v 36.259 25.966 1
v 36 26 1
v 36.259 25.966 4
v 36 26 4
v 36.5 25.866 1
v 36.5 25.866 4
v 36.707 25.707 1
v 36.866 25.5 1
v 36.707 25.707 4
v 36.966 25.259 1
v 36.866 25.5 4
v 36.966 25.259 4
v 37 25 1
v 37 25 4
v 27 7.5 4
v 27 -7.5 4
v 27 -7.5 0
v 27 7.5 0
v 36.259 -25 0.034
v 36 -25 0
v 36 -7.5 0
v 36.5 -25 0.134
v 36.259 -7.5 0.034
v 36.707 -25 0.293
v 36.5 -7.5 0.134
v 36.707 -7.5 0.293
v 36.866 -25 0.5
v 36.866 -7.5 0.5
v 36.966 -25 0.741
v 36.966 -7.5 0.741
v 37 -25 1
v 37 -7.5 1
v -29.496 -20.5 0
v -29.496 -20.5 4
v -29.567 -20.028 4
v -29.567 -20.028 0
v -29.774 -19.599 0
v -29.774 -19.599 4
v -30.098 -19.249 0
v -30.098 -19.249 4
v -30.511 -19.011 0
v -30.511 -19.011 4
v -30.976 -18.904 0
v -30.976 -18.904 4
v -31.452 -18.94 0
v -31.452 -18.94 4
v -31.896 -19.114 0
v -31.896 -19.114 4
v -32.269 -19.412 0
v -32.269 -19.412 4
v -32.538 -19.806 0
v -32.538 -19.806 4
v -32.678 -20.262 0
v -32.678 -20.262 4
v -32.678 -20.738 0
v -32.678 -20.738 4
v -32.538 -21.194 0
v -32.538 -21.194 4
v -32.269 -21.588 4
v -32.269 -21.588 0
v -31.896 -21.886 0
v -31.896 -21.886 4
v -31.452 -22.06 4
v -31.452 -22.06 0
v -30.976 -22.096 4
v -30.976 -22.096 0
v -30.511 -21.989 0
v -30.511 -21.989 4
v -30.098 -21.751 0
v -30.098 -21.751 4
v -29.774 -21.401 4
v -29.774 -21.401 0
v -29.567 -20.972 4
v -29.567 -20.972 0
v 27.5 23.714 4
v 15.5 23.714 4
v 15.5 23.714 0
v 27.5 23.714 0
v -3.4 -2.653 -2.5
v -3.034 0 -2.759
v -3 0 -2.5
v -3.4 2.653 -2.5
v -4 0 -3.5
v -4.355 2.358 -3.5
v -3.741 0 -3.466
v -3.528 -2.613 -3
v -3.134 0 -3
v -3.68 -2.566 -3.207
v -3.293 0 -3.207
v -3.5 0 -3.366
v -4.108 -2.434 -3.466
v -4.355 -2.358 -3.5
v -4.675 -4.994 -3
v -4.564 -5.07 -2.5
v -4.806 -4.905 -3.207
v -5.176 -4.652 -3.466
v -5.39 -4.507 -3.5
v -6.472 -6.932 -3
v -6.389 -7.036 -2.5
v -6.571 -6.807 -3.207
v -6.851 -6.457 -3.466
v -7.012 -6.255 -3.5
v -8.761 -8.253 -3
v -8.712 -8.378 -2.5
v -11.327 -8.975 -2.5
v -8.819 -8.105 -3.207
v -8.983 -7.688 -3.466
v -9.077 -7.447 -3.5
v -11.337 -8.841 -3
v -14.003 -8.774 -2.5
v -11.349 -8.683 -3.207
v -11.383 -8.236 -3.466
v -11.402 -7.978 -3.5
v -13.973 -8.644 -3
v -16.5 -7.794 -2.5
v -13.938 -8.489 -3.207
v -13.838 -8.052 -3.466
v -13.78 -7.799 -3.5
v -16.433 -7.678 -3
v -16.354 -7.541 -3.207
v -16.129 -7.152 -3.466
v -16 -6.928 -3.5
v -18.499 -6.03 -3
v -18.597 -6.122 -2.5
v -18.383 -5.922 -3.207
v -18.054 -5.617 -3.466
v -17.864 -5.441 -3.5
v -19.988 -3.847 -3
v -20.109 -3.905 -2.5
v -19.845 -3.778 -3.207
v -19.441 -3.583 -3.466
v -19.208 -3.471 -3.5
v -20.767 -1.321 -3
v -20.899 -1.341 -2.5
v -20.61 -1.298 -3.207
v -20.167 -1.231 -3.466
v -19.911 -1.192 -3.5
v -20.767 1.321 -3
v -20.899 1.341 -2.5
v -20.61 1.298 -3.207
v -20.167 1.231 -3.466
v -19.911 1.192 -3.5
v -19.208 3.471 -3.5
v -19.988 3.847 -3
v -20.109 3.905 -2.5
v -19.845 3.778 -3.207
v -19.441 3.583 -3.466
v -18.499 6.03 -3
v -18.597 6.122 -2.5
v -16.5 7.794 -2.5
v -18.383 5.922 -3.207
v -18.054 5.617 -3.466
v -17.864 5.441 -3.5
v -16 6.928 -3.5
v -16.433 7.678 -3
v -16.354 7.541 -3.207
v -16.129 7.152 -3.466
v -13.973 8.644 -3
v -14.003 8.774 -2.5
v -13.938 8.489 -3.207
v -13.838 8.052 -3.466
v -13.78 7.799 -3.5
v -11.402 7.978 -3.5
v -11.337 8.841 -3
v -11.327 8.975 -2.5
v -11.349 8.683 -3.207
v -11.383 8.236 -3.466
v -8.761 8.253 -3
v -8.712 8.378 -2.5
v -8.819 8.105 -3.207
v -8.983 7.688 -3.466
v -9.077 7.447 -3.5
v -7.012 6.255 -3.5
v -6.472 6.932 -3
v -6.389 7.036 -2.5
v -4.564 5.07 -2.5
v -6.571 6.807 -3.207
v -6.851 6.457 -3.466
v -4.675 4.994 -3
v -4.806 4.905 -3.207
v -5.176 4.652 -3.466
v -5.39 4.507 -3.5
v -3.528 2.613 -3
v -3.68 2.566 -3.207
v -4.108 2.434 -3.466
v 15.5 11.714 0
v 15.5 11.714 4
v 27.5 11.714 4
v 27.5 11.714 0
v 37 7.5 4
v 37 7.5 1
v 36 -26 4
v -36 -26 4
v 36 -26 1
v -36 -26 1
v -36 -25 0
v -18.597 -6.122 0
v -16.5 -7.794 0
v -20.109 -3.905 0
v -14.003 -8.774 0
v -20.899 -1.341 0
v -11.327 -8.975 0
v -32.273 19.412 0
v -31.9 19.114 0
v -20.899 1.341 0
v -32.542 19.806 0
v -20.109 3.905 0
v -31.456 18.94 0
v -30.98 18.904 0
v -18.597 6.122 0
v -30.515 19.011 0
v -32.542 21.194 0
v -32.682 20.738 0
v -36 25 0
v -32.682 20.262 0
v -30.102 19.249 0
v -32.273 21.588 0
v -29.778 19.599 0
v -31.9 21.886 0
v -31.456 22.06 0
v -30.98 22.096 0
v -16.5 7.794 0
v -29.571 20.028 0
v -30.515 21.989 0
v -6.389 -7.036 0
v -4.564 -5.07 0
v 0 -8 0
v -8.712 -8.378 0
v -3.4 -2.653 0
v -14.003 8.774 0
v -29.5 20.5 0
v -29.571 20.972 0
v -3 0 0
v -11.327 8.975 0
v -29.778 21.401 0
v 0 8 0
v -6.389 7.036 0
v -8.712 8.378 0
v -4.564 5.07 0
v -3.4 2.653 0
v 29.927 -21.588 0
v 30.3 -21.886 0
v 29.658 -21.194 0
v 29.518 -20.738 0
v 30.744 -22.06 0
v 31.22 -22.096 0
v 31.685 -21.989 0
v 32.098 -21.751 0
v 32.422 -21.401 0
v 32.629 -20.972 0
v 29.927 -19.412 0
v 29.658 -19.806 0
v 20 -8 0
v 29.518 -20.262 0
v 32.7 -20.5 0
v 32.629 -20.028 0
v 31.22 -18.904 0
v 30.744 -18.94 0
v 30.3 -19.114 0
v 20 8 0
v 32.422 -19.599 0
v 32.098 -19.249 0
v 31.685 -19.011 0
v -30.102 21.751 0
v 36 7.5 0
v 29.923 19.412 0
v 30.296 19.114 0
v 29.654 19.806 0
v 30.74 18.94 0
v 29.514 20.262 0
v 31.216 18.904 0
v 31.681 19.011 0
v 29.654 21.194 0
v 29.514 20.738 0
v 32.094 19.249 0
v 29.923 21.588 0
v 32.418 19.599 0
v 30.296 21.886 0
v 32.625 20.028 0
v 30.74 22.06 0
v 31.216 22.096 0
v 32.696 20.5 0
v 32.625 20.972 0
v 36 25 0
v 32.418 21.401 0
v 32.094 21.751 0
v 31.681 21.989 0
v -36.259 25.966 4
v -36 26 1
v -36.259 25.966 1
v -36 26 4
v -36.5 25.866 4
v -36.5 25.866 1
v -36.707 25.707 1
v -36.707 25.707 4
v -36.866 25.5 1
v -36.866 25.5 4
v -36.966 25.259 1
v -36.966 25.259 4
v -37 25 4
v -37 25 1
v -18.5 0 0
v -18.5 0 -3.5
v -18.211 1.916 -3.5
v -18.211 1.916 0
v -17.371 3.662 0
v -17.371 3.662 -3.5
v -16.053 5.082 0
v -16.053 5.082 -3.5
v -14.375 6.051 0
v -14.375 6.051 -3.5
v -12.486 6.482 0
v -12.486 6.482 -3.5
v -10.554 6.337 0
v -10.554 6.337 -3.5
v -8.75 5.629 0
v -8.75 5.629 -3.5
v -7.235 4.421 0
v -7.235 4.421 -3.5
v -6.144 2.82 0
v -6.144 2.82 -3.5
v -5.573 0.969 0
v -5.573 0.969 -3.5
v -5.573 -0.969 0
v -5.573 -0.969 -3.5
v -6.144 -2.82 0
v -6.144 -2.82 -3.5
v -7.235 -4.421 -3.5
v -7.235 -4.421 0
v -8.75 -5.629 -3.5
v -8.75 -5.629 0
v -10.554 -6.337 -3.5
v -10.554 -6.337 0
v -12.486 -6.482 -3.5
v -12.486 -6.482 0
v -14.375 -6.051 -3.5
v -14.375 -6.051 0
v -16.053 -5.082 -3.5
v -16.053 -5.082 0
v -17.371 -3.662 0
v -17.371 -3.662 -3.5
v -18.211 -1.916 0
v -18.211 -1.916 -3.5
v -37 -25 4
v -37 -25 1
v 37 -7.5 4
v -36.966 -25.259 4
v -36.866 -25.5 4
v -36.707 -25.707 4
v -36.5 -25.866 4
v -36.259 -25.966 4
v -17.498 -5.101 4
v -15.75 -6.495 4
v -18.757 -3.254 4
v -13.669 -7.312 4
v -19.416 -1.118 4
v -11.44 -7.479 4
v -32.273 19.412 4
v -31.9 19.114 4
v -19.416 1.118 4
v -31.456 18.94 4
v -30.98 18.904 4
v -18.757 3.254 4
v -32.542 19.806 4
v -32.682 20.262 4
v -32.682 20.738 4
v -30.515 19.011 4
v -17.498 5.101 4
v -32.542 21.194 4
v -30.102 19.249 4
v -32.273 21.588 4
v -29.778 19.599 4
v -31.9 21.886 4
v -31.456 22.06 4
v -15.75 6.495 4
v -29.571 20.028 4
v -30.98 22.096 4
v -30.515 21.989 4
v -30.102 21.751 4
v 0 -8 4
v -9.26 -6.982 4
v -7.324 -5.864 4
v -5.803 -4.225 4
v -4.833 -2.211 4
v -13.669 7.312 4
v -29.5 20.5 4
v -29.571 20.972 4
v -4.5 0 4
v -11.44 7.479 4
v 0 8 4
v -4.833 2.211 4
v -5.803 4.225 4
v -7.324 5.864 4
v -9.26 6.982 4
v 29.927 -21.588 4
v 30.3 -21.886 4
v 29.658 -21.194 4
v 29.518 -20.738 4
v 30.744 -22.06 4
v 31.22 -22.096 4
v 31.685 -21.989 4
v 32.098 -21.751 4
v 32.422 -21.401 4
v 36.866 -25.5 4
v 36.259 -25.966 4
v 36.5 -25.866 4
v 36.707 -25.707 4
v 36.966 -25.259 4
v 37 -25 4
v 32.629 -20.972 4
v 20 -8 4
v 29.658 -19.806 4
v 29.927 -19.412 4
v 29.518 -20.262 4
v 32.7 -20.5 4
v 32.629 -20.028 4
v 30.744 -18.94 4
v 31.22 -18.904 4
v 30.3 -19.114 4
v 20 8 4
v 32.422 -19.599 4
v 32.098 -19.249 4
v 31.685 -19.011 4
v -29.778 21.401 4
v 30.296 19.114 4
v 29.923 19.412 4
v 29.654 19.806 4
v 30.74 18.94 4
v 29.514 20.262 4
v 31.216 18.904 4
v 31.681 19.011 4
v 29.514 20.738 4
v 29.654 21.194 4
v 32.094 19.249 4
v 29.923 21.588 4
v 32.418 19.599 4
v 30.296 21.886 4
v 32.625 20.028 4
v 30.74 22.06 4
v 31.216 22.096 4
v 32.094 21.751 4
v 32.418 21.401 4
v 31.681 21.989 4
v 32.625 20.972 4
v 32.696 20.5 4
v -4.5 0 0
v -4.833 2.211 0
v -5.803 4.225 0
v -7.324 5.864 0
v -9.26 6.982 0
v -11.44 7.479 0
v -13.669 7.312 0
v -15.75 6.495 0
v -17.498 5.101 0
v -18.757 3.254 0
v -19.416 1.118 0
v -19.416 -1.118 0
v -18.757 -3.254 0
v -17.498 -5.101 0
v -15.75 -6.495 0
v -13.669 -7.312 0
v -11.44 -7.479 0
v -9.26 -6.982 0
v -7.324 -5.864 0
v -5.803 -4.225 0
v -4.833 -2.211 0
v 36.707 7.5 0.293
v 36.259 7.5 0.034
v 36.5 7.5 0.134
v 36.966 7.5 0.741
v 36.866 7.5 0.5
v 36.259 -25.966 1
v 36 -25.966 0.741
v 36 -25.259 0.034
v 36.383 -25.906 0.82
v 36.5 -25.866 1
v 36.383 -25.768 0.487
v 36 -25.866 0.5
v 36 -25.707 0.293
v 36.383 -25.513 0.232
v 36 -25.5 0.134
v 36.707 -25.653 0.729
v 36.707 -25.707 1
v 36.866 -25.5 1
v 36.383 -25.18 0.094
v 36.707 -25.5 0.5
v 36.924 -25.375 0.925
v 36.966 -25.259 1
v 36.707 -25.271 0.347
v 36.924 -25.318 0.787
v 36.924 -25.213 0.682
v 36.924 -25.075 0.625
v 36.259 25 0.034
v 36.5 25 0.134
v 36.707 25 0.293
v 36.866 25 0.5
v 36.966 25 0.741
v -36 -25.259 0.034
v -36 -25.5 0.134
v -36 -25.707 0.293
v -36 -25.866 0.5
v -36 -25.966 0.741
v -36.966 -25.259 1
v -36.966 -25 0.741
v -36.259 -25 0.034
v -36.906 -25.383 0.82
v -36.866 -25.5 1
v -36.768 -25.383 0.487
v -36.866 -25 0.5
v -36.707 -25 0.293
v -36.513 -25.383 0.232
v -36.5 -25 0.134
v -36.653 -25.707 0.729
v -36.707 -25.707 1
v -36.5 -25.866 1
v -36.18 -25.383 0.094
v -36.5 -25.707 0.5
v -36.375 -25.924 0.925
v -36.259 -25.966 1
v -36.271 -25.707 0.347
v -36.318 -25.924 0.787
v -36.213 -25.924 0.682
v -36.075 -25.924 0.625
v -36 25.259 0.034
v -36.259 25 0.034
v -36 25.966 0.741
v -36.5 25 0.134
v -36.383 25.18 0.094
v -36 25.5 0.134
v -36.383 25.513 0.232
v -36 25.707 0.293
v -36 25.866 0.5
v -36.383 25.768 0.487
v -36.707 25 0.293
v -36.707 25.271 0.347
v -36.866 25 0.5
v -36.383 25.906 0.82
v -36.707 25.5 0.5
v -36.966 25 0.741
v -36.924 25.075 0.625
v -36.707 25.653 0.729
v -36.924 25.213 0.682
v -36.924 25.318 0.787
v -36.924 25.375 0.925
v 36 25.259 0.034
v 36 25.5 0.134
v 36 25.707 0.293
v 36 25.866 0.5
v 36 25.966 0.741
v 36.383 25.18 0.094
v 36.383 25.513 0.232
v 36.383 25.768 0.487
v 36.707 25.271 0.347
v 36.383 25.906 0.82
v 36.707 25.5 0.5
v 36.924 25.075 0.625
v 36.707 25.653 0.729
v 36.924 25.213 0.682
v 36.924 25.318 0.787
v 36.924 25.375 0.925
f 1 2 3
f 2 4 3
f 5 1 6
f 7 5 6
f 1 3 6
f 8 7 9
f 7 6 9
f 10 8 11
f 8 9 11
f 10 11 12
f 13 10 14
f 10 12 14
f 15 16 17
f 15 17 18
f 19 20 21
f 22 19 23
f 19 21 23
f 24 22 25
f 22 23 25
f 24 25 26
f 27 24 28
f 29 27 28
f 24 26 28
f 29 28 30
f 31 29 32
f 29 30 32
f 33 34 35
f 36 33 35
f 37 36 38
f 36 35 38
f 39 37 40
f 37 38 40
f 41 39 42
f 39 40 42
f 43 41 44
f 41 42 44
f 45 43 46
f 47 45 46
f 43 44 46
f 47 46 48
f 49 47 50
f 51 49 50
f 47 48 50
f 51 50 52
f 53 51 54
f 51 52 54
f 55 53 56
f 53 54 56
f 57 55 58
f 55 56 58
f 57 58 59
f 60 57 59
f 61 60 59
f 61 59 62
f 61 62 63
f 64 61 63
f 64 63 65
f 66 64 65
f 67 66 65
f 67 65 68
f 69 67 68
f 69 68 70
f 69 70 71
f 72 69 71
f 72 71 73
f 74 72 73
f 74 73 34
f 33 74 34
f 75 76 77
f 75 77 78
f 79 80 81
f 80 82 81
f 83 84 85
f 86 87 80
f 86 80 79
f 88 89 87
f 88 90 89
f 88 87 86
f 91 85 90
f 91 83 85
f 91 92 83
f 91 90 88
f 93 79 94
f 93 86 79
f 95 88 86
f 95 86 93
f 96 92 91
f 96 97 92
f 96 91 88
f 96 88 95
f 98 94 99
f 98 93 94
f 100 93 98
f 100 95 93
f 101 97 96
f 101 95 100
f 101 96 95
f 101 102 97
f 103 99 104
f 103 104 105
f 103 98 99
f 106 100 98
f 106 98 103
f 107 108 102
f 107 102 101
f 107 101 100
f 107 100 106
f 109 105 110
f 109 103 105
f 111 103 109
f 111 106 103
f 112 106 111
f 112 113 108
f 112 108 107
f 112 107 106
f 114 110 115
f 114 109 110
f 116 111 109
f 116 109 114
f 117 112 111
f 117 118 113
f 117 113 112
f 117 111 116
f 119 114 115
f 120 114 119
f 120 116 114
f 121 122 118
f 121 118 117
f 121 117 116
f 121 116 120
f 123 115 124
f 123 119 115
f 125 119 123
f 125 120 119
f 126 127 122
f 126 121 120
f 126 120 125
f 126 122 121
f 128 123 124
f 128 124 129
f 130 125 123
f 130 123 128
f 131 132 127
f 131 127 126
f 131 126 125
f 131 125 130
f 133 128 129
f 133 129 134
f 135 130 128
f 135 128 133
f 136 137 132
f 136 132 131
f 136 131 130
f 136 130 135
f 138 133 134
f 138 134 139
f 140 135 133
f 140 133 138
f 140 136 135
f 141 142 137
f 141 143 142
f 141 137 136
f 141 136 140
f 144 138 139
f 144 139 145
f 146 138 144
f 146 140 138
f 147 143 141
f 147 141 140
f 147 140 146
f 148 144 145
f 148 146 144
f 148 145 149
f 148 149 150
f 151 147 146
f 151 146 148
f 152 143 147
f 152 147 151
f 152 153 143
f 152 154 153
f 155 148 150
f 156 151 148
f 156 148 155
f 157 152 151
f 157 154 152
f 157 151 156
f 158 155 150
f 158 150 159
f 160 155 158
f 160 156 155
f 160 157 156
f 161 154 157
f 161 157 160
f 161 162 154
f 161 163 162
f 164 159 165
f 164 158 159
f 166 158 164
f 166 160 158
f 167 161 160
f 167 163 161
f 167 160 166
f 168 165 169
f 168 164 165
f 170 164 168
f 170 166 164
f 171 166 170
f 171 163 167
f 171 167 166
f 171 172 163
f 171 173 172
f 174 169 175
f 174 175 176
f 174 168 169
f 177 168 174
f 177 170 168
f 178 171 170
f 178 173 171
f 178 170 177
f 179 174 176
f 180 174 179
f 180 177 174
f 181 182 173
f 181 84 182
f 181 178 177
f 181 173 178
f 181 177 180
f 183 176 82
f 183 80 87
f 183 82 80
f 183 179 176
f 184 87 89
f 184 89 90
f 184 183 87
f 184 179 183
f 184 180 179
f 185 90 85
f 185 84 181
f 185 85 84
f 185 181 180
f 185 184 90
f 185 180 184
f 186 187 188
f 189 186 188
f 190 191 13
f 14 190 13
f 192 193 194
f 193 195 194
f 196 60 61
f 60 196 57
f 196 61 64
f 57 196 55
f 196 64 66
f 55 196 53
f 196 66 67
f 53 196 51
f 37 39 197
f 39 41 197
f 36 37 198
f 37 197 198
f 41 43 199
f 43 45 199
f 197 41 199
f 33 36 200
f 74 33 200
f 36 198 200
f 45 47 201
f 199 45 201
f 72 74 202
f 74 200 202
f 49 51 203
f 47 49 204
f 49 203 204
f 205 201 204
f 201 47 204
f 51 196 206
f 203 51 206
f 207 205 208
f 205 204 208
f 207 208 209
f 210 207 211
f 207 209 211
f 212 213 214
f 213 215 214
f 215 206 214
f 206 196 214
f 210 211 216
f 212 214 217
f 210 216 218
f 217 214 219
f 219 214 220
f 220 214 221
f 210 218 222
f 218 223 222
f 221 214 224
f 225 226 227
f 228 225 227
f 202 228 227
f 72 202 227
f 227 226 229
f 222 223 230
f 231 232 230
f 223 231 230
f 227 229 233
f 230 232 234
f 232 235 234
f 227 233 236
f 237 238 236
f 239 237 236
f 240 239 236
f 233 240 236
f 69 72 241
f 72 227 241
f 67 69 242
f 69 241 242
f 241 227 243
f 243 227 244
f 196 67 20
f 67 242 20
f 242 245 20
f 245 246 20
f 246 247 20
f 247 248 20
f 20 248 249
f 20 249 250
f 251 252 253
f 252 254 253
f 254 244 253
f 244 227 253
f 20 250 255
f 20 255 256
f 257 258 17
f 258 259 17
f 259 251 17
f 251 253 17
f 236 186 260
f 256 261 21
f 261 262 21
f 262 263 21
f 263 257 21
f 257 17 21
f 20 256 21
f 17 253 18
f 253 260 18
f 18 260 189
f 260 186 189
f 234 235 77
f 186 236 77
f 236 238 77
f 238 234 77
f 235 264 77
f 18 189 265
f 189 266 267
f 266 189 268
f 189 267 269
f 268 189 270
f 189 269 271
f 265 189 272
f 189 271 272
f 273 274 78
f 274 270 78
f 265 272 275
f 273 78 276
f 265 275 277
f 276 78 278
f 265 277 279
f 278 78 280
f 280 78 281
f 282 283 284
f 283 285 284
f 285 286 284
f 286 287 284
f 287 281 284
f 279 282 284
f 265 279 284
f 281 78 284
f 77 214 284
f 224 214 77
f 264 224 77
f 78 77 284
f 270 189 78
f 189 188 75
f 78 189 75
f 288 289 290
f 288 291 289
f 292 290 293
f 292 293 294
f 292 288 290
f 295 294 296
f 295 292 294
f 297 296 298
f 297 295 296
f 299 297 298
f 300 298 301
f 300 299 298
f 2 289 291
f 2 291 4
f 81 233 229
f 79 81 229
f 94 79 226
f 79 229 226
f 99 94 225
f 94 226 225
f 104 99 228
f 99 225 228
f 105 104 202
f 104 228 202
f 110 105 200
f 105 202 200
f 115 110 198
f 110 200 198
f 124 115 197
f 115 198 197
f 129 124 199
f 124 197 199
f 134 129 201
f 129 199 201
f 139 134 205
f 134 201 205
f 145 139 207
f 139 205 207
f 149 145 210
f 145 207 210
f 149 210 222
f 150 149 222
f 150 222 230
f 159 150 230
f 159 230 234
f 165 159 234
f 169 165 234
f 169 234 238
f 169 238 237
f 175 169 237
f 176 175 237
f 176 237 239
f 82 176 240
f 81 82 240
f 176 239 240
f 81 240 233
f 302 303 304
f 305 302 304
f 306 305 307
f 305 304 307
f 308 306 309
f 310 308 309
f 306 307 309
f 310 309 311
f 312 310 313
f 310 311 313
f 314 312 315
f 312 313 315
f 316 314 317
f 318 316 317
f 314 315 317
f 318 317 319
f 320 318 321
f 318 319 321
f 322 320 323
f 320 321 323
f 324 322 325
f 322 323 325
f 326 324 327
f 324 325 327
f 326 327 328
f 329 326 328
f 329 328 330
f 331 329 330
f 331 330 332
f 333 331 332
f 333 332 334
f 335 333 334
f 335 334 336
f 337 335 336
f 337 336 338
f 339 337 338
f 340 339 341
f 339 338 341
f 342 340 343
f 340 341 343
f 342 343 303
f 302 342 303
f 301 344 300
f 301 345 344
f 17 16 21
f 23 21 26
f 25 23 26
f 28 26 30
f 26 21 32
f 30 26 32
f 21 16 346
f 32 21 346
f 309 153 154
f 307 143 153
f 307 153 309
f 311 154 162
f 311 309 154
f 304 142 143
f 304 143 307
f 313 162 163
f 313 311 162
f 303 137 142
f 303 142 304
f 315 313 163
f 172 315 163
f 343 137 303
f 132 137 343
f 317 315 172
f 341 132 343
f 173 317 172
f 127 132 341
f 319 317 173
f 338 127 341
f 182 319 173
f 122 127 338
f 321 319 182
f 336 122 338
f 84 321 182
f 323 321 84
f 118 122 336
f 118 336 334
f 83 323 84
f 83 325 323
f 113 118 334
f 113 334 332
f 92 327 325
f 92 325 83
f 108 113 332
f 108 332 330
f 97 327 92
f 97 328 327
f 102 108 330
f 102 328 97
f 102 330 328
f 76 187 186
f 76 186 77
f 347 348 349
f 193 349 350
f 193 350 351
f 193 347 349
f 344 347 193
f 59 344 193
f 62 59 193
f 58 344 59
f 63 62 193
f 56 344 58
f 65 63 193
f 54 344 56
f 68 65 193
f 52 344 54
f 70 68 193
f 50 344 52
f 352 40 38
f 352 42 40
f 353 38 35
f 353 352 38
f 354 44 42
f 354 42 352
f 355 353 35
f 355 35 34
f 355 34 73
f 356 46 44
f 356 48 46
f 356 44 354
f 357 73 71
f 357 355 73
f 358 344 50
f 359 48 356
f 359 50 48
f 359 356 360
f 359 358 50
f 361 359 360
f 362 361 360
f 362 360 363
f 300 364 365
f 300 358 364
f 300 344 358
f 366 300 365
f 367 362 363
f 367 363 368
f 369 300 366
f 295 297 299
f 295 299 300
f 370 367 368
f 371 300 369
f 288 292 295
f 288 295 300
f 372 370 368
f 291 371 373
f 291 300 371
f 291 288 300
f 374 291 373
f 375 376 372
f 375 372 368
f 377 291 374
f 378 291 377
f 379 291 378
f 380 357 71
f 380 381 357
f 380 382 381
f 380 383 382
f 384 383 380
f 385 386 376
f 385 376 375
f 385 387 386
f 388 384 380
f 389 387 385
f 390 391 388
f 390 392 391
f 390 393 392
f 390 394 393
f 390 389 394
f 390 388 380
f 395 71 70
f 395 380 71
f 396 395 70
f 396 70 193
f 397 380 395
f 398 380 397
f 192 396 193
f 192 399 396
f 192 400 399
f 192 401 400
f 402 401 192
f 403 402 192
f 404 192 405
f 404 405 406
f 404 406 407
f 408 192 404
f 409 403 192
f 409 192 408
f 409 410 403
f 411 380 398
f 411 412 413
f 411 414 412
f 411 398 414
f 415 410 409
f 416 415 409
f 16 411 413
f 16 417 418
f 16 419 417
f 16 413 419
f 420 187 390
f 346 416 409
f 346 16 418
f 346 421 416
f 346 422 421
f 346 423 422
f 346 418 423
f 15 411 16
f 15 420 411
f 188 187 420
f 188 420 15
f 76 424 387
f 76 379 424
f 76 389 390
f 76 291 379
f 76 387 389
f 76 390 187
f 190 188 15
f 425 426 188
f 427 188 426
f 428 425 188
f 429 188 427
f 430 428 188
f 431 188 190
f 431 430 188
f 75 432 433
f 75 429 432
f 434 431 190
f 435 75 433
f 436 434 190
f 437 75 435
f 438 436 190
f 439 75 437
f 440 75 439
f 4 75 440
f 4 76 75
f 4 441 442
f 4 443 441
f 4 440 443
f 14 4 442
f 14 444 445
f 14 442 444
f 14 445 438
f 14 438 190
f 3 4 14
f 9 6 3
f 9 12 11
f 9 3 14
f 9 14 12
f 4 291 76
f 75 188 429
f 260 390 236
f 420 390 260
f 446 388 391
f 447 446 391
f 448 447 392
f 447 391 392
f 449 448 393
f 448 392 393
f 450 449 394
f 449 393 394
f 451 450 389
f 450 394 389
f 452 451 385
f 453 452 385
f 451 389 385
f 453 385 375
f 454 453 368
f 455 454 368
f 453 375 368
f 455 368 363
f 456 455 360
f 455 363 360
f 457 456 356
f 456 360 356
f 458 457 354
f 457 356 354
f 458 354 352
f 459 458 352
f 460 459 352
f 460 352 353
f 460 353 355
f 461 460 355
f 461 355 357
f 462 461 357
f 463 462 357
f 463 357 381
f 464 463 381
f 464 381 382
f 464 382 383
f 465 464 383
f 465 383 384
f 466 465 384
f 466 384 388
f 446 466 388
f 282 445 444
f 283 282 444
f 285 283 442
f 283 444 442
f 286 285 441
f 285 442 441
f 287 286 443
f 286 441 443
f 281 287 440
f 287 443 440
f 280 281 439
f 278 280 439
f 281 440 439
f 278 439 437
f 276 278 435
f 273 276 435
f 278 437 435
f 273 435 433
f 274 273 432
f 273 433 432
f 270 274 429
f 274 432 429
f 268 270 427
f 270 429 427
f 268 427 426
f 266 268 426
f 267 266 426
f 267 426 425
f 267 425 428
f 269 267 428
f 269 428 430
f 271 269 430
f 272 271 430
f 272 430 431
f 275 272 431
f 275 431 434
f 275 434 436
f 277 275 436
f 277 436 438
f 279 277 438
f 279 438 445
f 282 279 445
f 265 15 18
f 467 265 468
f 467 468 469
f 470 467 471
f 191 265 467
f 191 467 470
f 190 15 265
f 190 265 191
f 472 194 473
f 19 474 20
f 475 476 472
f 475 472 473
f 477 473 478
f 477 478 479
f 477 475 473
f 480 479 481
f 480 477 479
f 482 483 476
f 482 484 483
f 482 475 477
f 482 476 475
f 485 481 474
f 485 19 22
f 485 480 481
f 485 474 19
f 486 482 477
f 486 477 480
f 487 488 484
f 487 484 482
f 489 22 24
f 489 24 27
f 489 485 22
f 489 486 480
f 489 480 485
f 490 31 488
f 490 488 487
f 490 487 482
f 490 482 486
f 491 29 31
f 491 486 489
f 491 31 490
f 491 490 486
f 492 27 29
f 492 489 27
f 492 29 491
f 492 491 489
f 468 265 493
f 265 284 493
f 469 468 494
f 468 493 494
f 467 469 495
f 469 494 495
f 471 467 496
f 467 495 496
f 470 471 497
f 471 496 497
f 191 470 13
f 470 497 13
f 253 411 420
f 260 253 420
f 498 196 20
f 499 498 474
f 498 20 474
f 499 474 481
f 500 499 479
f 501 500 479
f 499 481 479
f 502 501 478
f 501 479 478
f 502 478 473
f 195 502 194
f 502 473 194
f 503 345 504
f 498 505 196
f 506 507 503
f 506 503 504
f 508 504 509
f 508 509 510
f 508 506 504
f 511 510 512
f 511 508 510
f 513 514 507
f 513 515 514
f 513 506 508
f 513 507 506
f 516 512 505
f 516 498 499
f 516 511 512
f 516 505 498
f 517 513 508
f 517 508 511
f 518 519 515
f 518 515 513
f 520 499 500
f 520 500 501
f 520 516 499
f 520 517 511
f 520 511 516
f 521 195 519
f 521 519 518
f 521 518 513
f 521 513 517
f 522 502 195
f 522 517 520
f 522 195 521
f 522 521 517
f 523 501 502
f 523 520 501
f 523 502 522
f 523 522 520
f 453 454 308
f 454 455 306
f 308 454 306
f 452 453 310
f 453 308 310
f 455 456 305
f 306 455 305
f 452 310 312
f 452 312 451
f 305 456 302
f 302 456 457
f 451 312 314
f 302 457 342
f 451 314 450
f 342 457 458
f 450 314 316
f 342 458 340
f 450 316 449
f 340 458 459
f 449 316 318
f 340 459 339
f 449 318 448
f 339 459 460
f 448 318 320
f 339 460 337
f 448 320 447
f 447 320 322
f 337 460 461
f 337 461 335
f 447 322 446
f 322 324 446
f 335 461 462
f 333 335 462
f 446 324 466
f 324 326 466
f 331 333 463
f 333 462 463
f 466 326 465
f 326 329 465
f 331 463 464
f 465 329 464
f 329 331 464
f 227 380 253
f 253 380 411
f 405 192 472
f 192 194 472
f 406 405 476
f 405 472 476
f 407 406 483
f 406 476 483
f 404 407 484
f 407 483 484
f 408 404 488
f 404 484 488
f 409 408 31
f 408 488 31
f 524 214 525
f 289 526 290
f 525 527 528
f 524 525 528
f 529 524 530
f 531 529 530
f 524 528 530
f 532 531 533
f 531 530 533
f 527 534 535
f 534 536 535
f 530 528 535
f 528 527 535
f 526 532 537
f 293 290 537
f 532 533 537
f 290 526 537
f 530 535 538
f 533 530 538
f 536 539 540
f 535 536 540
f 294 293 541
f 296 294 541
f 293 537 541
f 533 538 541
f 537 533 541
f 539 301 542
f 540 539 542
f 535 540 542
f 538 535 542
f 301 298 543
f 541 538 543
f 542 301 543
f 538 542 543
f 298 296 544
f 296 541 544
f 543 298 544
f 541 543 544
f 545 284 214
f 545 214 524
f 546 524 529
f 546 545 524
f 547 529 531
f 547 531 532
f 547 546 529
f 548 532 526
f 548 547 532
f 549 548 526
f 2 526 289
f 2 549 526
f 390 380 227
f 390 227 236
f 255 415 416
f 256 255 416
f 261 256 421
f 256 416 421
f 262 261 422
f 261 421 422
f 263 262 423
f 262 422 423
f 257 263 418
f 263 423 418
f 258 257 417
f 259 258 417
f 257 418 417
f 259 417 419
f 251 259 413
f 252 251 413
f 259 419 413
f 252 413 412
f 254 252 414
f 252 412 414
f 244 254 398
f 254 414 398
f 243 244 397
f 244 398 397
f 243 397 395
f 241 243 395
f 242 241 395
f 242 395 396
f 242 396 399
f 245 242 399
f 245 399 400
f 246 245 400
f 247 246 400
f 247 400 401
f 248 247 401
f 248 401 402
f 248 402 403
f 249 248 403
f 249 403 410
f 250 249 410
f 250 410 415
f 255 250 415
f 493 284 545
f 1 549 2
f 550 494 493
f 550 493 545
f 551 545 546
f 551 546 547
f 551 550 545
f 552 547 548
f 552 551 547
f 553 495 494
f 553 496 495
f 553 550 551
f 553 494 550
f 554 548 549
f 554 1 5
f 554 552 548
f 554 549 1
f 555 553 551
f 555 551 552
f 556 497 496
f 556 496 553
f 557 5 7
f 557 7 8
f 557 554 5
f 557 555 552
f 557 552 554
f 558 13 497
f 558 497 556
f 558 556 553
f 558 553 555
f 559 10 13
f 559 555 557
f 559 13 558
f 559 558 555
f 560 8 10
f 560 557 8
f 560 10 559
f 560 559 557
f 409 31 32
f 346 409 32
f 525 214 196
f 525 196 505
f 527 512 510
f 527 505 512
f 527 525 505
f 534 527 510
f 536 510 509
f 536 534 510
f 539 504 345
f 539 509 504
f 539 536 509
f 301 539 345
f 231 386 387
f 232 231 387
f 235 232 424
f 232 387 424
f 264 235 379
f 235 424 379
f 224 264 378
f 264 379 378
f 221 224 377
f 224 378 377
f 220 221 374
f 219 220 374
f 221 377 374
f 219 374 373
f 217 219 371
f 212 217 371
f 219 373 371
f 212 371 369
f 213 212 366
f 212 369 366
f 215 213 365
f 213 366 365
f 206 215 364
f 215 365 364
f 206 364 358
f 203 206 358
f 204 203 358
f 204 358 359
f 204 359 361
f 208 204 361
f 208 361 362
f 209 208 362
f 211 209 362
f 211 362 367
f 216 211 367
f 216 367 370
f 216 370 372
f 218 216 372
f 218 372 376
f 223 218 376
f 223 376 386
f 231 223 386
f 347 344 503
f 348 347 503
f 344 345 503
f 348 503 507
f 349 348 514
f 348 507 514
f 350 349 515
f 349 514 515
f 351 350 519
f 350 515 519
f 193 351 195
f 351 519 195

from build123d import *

# Parameters (mm, degrees)
ENCLOSURE_TOP_SKETCH_W          = 74
ENCLOSURE_TOP_SKETCH_H          = 52
ENCLOSURE_TOP_FEATURE_DEPTH     = 4
SCREW_HOLES_SKETCH_R            = 1.6
SCREW_HOLES_FEATURE_DEPTH       = 46.398237851
CAMERA_LIGHT_HOLE_SKETCH_R      = 7.5
CAMERA_LIGHT_HOLE_SKETCH_W      = 20
CAMERA_LIGHT_HOLE_SKETCH_H      = 16
CAMERA_LIGHT_HOLE_SKETCH_W_2    = 10
CAMERA_LIGHT_HOLE_SKETCH_H_2    = 15
CAMERA_LIGHT_HOLE_SKETCH_W_3    = 12
CAMERA_LIGHT_HOLE_SKETCH_H_3    = 12
CAMERA_LIGHT_HOLE_FEATURE_DEPTH = 46.398237851
FILTER_COVER_SKETCH_R           = 9
FILTER_COVER_FEATURE_DEPTH      = 3.5
FILTER_CUT_SKETCH_R             = 6.5
FILTER_CUT_DEPTH                = 3.5
FILLET1_R                       = 1
FILLET2_R                       = 1
FILLET3_R                       = 1
FILLET4_R                       = 1
FILLET5_R                       = 1
FILLET6_R                       = 1


with BuildPart() as part:
    # Enclosure Top Sketch → Enclosure Top Feature (new body)
    with BuildSketch(Plane.XY):
        Rectangle(ENCLOSURE_TOP_SKETCH_W, ENCLOSURE_TOP_SKETCH_H)
    extrude(amount=ENCLOSURE_TOP_FEATURE_DEPTH)

    # Screw Holes Sketch → Screw Holes Feature (cut, through all)
    with BuildSketch(Plane.XY.offset(4)):
        with Locations((-31.1, 20.5)):
            Circle(SCREW_HOLES_SKETCH_R)
        with Locations((31.096, 20.5)):
            Circle(SCREW_HOLES_SKETCH_R)
        with Locations((31.1, -20.5)):
            Circle(SCREW_HOLES_SKETCH_R)
        with Locations((-31.096, -20.5)):
            Circle(SCREW_HOLES_SKETCH_R)
    extrude(amount=-SCREW_HOLES_FEATURE_DEPTH, mode=Mode.SUBTRACT)

    # Camera + Light Hole Sketch → Camera _ Light Hole Feature (cut, through all)
    with BuildSketch(Plane.XY.offset(4)):
        with Locations((-12, 0)):
            Circle(CAMERA_LIGHT_HOLE_SKETCH_R)
        with Locations((10, 0)):
            Rectangle(CAMERA_LIGHT_HOLE_SKETCH_W, CAMERA_LIGHT_HOLE_SKETCH_H)
        with Locations((32, 0)):
            Rectangle(CAMERA_LIGHT_HOLE_SKETCH_W_2, CAMERA_LIGHT_HOLE_SKETCH_H_2)
        with Locations((21.5, 17.714)):
            Rectangle(CAMERA_LIGHT_HOLE_SKETCH_W_3, CAMERA_LIGHT_HOLE_SKETCH_H_3)
    extrude(amount=-CAMERA_LIGHT_HOLE_FEATURE_DEPTH, mode=Mode.SUBTRACT)

    # Filter Cover Sketch → Filter Cover Feature (add)
    with BuildSketch(Plane(origin=(0, 0, 0), x_dir=(-1, 0, 0), z_dir=(0, 0, -1))):
        with Locations(Location((12, 0, 0), (0, 0, 180))):
            Circle(FILTER_COVER_SKETCH_R)
    extrude(amount=FILTER_COVER_FEATURE_DEPTH)

    # Filter Cut Sketch → Filter Cut (cut)
    with BuildSketch(Plane(origin=(0, 0, -3.5), x_dir=(-1, 0, 0), z_dir=(0, 0, -1))):
        with Locations((12, 0)):
            Circle(FILTER_CUT_SKETCH_R)
    extrude(amount=-FILTER_CUT_DEPTH, mode=Mode.SUBTRACT)

    # Fillet1
    fillet1_edges = [part.edges().sort_by_distance(p)[0] for p in [
        (0, 26, 0),
    ]]
    fillet(fillet1_edges, radius=FILLET1_R)

    # Fillet2
    fillet2_edges = [part.edges().sort_by_distance(p)[0] for p in [
        (-37, -0.5, 0),
        (-37, 25.707106781, 0.292893219),
        (-37, 26, 2.5),
    ]]
    fillet(fillet2_edges, radius=FILLET2_R)

    # Fillet3
    fillet3_edges = [part.edges().sort_by_distance(p)[0] for p in [
        (0.5, -26, 0),
        (-36.707106781, -26, 0.292893219),
        (-37, -26, 2.5),
    ]]
    fillet(fillet3_edges, radius=FILLET3_R)

    # Fillet4
    fillet4_edges = [part.edges().sort_by_distance(p)[0] for p in [
        (37, -16.25, 0),
        (37, -25.707106781, 0.292893219),
        (37, -26, 2.5),
    ]]
    fillet(fillet4_edges, radius=FILLET4_R)

    # Fillet5
    fillet5_edges = [part.edges().sort_by_distance(p)[0] for p in [
        (37, 25.707106781, 0.292893219),
        (37, 16.25, 0),
        (37, 26, 2.5),
    ]]
    fillet(fillet5_edges, radius=FILLET5_R)

    # Fillet6
    fillet6_edges = [part.edges().sort_by_distance(p)[0] for p in [
        (-21, 0, -3.5),
    ]]
    fillet(fillet6_edges, radius=FILLET6_R)


solid = part.part
